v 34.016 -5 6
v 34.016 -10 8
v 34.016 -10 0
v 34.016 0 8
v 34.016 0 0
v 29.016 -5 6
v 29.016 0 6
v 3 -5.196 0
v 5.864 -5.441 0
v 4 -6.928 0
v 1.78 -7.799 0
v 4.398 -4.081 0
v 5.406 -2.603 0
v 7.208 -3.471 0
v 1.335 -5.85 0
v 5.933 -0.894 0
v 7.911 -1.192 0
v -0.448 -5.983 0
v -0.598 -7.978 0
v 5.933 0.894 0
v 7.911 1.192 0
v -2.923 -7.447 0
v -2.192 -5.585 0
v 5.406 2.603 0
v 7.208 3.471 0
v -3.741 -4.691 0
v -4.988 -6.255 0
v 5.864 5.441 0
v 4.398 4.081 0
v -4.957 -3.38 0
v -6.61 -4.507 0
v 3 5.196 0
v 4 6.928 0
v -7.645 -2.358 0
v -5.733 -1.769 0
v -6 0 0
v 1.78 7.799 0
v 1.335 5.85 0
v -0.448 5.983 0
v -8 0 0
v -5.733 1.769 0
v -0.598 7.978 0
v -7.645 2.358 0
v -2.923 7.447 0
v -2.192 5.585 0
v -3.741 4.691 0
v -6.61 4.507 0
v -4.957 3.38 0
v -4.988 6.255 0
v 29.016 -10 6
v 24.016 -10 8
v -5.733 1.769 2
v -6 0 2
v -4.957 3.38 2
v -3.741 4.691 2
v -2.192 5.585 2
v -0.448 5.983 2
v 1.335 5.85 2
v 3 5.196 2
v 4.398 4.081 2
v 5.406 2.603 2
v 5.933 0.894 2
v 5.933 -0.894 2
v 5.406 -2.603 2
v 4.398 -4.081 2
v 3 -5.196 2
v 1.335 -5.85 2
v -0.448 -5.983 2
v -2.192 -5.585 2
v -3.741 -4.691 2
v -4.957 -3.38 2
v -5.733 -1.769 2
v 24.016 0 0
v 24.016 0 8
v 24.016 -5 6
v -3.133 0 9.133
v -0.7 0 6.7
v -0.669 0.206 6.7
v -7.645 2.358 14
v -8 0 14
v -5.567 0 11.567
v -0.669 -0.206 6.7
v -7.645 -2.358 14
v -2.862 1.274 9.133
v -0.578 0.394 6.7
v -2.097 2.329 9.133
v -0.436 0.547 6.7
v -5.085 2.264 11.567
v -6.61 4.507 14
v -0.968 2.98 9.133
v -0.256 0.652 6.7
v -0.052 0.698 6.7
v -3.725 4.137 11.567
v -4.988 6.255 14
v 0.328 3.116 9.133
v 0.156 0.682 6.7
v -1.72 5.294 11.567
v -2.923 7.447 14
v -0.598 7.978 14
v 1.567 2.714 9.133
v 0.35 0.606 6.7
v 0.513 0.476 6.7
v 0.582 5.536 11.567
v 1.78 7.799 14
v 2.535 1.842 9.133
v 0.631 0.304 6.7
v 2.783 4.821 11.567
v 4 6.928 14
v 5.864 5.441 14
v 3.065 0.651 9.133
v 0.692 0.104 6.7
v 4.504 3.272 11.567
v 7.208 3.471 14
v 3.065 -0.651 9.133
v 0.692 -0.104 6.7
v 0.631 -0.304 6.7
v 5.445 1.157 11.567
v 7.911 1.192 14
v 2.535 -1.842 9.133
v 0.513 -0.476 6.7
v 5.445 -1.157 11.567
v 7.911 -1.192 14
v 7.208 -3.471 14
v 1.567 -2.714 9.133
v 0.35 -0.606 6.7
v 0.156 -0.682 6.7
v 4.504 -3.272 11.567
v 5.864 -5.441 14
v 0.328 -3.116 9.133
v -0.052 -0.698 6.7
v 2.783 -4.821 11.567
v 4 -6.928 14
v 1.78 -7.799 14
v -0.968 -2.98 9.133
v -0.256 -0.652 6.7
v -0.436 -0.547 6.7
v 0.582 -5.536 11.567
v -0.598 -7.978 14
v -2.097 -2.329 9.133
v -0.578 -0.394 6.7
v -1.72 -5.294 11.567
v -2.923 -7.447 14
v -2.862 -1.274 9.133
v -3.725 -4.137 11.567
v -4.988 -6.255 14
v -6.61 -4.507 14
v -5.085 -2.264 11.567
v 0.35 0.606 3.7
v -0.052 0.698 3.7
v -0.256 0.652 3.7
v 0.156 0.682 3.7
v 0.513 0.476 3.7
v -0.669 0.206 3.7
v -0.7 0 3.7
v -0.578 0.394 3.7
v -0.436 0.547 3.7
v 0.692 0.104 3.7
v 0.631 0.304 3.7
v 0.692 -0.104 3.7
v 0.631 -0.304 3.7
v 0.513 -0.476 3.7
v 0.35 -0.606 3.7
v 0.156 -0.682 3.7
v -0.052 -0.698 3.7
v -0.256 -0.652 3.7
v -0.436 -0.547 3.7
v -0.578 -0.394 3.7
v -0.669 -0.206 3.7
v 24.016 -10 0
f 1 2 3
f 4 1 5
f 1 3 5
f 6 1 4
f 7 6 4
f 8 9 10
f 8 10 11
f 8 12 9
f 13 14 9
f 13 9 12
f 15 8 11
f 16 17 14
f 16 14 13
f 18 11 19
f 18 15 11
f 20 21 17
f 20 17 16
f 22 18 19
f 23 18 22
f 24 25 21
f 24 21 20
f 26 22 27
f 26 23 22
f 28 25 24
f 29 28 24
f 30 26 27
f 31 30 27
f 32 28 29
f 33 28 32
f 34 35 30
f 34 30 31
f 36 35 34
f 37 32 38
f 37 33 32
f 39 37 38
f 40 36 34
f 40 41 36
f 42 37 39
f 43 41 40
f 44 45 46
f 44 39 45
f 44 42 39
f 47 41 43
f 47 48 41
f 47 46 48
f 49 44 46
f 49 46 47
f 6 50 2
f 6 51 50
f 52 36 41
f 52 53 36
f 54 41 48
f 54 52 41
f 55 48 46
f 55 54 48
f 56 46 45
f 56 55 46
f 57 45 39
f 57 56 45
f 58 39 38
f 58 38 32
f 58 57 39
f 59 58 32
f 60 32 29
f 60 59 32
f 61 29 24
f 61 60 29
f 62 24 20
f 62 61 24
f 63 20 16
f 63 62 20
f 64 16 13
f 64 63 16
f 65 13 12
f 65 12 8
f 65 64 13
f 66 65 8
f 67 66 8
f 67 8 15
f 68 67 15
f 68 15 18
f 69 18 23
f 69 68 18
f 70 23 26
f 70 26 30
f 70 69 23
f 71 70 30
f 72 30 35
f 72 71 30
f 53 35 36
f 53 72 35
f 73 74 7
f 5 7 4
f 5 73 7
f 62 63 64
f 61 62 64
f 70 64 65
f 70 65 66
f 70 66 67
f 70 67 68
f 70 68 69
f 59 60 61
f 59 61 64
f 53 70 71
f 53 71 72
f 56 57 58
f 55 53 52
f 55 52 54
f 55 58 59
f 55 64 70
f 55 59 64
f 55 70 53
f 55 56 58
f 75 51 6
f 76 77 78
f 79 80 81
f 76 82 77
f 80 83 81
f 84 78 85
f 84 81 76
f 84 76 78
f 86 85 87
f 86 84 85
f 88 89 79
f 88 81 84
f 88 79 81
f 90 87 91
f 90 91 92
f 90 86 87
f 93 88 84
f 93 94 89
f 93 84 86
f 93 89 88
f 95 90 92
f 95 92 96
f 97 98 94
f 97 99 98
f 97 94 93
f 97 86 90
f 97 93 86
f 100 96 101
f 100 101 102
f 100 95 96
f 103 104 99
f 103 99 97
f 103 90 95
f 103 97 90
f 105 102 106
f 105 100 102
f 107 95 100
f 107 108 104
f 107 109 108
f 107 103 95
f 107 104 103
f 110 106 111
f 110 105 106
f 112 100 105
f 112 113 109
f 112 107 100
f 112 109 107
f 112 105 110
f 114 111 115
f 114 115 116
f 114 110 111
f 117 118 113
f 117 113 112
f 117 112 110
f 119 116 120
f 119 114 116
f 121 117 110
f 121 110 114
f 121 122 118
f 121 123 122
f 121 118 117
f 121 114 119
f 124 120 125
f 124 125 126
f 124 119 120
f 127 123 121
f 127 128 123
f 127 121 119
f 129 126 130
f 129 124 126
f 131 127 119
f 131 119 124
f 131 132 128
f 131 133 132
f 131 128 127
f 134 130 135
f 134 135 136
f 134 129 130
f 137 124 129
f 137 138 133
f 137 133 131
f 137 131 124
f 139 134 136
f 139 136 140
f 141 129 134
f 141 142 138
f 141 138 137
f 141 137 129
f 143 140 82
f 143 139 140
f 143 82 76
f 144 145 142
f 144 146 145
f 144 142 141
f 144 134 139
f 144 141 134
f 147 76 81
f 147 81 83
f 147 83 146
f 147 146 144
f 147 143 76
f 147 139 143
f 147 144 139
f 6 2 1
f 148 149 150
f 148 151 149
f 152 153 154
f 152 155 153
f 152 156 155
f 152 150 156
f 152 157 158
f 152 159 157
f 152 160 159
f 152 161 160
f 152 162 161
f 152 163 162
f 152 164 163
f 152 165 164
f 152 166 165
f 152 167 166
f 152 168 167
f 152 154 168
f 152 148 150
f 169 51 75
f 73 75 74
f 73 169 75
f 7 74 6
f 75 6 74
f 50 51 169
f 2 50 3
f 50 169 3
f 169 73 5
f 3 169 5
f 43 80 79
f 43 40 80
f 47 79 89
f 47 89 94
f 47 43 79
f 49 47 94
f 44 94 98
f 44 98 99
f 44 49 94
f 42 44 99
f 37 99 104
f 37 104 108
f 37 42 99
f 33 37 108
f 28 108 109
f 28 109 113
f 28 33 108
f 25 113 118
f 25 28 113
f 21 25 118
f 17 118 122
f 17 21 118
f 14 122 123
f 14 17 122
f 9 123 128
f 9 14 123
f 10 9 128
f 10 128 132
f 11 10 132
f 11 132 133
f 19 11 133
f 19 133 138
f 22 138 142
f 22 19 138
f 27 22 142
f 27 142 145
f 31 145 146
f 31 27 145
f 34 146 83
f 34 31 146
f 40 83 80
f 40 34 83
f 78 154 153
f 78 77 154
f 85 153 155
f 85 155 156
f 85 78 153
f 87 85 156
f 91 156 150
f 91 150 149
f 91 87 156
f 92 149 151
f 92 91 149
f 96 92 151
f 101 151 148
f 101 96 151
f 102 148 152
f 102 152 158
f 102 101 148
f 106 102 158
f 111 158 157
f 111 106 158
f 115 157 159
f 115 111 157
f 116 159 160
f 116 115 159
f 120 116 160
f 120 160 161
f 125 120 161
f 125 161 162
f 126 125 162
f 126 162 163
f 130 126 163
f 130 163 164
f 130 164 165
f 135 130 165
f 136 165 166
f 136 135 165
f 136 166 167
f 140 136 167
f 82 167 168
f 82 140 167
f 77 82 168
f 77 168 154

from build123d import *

# Parameters (mm, degrees)
F2_W     = 10
F2_H     = 10
F3_DEPTH = 8
F5_DEPTH = 10
F7_DEPTH = 25


with BuildPart() as f1:
    # F0 (on Front) → F1 (revolve)
    with BuildSketch(Plane.XZ):
        Polygon((-6, 2), (0, 2), (0, 3.7), (-0.7, 3.7), (-0.7, 6.7), (-8, 14), (-8, 0), (-6, 0), align=None)
    revolve(axis=Axis((0, 0, 2.85), (0, 0, -1)))


with BuildPart() as f3:
    # F2 (on Top) → F3 (new body)
    with BuildSketch(Plane.XY):
        with Locations((29.015555, -5)):
            Rectangle(F2_W, F2_H)
    extrude(amount=F3_DEPTH)

    # F4 (on face) → F5 (cut, through all)
    with BuildSketch(Plane.XZ.offset(10)):
        Polygon((34.015555, 8), (24.015555, 8), (29.015555, 6), align=None)
    extrude(amount=-F5_DEPTH, mode=Mode.SUBTRACT)

    # F6 (on face) → F7 (cut)
    with BuildSketch(Plane.YZ.offset(34.015555)):
        Polygon((0, 8), (-10, 8), (-5, 6), align=None)
    extrude(amount=-F7_DEPTH, mode=Mode.SUBTRACT)


solid = Compound([f1.part, f3.part])
